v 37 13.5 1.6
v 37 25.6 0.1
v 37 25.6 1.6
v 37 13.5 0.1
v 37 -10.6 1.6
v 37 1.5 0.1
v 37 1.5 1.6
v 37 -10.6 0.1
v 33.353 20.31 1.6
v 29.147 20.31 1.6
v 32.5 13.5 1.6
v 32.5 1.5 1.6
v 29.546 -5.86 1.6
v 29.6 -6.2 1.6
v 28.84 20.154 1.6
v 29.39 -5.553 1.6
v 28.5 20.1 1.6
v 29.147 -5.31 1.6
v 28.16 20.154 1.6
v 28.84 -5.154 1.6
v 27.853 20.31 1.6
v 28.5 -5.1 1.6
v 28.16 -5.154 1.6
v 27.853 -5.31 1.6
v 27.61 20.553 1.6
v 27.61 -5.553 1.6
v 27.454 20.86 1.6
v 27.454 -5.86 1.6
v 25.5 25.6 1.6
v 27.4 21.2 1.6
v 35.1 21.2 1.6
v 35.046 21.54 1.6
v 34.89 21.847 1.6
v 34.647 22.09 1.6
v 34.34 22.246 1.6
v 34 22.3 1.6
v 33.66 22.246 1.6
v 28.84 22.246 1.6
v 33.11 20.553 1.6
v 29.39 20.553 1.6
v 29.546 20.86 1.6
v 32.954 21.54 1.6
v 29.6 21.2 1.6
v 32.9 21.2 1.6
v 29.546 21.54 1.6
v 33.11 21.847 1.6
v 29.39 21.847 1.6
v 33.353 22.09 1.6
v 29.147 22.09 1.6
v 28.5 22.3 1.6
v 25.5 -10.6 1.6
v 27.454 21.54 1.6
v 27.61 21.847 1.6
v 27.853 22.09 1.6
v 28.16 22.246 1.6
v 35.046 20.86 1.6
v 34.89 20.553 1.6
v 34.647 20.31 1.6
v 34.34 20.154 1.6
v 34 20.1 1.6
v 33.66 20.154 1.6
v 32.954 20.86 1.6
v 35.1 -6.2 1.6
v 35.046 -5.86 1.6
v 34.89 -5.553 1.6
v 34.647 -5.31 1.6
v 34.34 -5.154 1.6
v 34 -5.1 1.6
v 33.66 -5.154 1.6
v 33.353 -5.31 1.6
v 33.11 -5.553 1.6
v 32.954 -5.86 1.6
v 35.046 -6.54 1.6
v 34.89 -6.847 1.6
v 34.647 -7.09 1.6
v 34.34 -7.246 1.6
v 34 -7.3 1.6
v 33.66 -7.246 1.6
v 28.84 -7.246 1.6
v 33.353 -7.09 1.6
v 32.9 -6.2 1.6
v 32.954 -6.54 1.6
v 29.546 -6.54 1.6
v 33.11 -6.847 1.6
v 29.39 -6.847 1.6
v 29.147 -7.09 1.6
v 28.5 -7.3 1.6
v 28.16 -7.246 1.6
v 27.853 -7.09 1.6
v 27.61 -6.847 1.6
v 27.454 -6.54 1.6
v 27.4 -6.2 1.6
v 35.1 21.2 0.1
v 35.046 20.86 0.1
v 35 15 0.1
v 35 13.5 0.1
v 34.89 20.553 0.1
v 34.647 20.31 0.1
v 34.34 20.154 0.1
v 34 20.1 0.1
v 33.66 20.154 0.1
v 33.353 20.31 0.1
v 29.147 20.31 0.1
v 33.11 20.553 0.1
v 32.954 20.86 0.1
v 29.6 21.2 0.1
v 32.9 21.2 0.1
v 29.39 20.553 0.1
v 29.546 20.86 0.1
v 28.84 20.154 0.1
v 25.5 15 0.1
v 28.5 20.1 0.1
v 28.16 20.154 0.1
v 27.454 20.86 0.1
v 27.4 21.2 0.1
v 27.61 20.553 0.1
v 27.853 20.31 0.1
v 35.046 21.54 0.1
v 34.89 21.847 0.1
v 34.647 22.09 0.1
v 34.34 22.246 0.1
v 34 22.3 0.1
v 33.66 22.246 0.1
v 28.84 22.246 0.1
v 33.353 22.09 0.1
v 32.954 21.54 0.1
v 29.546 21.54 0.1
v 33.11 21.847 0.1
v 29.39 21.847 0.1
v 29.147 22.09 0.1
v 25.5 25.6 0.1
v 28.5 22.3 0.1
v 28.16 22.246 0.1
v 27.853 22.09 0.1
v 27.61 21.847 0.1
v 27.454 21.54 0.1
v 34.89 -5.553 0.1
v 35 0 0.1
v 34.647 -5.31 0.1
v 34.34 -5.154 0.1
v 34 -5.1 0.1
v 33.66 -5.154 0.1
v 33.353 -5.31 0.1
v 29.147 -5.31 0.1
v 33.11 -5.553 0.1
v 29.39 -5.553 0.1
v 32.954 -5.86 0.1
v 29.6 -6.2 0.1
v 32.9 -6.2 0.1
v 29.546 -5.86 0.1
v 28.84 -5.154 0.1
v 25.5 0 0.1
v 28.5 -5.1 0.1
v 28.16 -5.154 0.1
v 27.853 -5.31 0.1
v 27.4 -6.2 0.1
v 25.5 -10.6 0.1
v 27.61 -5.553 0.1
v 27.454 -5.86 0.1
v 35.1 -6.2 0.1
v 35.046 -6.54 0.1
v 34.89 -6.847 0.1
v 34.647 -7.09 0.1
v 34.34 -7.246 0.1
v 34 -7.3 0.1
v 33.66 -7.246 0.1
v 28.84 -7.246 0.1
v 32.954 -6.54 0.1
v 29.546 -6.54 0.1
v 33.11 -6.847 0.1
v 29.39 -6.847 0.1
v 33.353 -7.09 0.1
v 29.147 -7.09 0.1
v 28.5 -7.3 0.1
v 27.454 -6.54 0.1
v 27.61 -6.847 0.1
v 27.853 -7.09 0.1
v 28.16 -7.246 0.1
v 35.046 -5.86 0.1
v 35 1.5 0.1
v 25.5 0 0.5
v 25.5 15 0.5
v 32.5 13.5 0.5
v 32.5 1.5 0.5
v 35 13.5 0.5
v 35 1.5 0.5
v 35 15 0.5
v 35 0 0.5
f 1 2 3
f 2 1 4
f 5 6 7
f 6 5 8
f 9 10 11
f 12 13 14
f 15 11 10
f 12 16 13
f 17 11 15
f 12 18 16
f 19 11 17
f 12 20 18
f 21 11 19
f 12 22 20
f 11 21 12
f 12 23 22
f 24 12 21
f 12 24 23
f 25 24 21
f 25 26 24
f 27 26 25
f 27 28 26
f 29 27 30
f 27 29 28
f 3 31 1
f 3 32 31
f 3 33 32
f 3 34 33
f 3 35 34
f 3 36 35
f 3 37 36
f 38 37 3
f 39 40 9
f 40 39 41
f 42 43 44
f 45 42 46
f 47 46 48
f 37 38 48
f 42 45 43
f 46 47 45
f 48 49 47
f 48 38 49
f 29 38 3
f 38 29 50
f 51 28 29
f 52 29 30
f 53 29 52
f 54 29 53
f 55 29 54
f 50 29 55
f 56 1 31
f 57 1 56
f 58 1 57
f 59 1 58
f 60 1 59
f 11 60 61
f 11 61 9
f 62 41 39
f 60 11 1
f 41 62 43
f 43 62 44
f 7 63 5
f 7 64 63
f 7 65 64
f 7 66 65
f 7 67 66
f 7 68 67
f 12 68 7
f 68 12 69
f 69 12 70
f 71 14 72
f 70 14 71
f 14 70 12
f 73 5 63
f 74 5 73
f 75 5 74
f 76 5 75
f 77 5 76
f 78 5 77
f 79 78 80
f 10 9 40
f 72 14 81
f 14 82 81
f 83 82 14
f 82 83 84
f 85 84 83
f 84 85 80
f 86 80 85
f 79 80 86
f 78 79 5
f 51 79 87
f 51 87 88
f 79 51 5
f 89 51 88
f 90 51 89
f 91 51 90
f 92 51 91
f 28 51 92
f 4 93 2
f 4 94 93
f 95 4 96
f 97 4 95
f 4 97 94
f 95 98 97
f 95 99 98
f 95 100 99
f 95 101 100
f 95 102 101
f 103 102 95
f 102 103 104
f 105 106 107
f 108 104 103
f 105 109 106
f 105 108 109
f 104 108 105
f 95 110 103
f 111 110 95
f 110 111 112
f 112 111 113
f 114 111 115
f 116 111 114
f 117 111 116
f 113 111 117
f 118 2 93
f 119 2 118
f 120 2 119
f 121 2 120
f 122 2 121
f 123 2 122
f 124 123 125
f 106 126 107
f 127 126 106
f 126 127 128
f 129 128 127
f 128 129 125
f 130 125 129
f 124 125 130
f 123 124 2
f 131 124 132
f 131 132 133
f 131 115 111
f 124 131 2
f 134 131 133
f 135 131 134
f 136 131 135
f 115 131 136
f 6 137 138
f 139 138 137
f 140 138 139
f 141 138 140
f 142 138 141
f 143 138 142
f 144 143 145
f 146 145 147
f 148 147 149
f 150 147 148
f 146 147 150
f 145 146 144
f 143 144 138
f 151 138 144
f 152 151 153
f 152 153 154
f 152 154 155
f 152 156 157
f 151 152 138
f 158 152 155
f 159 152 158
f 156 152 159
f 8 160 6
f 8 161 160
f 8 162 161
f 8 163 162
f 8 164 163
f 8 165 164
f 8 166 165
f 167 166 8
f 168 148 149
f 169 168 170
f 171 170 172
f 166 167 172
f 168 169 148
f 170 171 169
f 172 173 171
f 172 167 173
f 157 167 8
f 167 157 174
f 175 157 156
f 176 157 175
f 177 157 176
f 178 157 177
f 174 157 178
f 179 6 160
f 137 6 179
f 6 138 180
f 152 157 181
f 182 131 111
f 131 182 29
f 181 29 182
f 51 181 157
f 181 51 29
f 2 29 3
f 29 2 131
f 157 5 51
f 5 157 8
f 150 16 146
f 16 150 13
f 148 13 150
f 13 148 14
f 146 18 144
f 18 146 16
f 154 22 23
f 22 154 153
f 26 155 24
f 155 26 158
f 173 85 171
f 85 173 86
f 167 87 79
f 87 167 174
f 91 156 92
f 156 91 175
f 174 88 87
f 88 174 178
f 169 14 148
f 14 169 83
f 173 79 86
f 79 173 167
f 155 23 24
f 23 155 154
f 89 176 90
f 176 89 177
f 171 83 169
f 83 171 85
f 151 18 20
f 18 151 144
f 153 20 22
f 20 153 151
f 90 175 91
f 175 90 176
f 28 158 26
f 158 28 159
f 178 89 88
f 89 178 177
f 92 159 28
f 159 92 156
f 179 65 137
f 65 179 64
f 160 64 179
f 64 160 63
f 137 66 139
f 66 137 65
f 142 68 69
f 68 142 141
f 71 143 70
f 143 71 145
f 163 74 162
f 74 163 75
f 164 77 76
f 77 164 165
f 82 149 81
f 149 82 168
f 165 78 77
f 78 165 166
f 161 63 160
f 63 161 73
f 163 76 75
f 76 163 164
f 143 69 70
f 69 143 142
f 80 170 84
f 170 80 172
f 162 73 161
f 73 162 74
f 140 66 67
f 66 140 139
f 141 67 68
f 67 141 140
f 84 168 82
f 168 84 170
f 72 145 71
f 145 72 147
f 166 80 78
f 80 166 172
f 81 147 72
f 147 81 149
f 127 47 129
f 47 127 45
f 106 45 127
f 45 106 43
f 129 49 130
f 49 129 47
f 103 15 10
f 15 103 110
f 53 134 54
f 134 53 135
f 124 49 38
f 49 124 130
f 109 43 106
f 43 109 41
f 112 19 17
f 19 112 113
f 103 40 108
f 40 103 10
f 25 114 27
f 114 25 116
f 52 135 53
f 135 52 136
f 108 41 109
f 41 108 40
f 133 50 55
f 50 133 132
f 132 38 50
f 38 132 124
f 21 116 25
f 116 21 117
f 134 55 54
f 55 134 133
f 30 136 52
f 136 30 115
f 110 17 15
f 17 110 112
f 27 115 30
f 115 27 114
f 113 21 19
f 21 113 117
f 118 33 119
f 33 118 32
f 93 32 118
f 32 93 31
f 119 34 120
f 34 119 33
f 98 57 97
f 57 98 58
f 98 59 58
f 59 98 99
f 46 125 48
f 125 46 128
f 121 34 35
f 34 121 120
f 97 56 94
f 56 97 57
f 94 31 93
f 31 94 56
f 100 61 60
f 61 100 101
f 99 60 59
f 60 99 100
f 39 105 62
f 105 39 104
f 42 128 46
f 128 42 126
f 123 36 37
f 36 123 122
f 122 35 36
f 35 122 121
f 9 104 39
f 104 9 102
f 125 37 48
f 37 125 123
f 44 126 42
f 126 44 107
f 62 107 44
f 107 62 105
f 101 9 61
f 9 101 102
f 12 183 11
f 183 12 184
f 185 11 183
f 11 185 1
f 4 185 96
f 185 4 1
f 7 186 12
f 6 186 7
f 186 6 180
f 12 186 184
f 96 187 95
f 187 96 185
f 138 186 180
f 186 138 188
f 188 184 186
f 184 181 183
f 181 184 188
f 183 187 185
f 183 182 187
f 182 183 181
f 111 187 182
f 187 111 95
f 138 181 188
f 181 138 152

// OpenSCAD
difference(){

difference(){
    union(){
        translate([20,15/2-36.2/2,0.1]){
            difference(){
                translate([5.5,0,0])
                cube([11.5,36.2,1.5]);
                translate([8.5,4.4,-0.1])
                cylinder(2,d=2.2,$fn=20);
                translate([17-3,4.4,-0.1])
                cylinder(2,d=2.2,$fn=20);
                translate([8.5,36.2-4.4,-0.1])
                cylinder(2,d=2.2,$fn=20);
                translate([17-3,36.2-4.4,-0.1])
                cylinder(2,d=2.2,$fn=20);
            }
        }
    }
    translate([32.5,15/2-12/2,0])
    cube([20,12,1.7]);
}


        

union(){
    difference(){
        union(){
            color("white")
            cube([35,15,0.5]);
            translate([0.5,0.5,0.5])
            color("black")
            cube([14,14,0.25]);
            translate([7.5-0.15/2,0.5,0.75])
            color("silver")
            cube([0.15,14,0.01]);
            translate([0.5,7.5-0.15/2,0.75])
            color("silver")
            cube([14,0.15,0.01]);
            color("silver")
            translate([0,0,0.5])
            cube([16.5,15,0.01]);
        }
        translate([7.5,7.5,0.4])
        color("black")
        cylinder(2,d=2,$fn=20);
        translate([7.5,7.5,-0.1])
        color("black")
        cylinder(0.6,d=7,$fn=20);
    }
    
    translate([35-1.8-0.3,7.5-1.2/2,0.5])
    color("gold")
    cube([1.8,1.2,0.01]);
    
    translate([35-1.8-0.3,2.54+7.5-1.2/2,0.5])
    color("gold")
    cube([1.8,1.2,0.01]);
    translate([35-1.8-0.3,2*2.54+7.5-1.2/2,0.5])
    color("gold")
    cube([1.8,1.2,0.01]);
    translate([35-1.8-0.3,-2.54+7.5-1.2/2,0.5])
    color("gold")
    cube([1.8,1.2,0.01]);
    translate([35-1.8-0.3,-2*2.54+7.5-1.2/2,0.5])
    color("gold")
    cube([1.8,1.2,0.01]);
}
}
